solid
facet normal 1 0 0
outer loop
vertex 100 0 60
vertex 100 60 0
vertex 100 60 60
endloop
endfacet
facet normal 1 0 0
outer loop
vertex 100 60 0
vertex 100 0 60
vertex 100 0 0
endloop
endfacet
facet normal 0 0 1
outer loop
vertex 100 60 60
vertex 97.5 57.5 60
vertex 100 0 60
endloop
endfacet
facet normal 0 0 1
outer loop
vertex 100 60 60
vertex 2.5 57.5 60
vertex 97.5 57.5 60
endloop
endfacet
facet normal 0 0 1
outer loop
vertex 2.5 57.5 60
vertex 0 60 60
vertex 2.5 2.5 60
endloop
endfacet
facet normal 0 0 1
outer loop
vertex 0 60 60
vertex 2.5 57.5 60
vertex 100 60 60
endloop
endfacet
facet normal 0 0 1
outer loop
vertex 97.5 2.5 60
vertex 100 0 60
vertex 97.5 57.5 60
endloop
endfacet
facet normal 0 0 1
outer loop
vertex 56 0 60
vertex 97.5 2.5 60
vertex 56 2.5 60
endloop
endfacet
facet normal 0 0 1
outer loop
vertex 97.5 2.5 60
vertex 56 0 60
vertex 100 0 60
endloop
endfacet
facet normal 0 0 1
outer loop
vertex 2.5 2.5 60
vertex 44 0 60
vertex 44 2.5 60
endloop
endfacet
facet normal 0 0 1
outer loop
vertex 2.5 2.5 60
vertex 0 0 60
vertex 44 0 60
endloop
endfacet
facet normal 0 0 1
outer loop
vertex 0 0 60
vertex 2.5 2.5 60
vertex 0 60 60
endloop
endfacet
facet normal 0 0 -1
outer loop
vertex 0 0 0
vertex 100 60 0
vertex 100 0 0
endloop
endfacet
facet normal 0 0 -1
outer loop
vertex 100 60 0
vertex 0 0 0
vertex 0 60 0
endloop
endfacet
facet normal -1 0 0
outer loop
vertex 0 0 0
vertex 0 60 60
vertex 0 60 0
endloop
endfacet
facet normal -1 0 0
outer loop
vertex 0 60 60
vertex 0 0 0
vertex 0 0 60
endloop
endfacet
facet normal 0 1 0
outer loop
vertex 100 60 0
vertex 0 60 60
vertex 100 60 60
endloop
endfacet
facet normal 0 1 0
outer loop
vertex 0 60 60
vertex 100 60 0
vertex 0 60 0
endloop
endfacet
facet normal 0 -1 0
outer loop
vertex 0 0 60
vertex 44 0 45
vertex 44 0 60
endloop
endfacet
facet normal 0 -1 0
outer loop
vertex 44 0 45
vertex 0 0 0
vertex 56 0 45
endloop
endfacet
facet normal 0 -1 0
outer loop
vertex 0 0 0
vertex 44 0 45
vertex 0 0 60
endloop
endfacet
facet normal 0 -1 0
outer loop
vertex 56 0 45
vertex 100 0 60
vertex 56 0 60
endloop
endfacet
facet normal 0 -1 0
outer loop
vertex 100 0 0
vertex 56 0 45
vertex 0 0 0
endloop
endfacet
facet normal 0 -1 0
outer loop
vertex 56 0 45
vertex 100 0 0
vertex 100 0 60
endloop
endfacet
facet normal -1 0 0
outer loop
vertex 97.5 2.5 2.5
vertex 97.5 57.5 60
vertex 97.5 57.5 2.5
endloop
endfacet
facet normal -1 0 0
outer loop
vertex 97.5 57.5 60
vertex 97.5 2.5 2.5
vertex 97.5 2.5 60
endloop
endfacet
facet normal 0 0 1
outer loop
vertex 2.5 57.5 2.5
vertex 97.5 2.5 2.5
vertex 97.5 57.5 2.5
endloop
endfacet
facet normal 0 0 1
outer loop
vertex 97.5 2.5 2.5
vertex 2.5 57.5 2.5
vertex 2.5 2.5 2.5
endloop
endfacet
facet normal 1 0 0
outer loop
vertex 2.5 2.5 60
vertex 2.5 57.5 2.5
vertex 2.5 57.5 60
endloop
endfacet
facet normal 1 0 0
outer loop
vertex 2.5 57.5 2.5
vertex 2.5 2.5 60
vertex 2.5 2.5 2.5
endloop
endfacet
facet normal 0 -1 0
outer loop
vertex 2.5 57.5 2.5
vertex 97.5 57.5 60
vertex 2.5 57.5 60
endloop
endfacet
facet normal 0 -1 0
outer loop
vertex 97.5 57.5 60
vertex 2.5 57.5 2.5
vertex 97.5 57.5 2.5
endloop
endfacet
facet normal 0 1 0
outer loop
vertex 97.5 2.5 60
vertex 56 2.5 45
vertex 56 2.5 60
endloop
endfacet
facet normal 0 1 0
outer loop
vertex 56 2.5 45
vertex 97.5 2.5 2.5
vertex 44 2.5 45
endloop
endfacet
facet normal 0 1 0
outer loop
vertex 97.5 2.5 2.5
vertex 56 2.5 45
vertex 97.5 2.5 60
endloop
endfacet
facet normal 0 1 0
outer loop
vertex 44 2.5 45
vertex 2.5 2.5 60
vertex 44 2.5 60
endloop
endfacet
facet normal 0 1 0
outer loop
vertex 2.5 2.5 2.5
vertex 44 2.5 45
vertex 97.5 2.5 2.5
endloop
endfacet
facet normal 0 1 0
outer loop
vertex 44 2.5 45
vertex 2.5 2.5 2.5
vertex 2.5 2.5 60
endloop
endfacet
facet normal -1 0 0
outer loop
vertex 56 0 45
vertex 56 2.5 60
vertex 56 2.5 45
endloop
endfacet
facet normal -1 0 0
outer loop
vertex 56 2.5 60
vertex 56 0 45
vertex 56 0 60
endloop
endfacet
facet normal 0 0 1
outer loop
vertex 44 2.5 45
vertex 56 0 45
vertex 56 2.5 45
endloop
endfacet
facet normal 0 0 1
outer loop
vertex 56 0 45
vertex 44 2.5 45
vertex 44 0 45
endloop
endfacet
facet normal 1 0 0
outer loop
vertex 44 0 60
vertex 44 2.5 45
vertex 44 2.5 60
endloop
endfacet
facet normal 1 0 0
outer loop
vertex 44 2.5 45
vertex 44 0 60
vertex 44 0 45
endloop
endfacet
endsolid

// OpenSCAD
$fn = 32;

// ----------------------------------------------------------------------
// Enclosure box: notch enclosure
// ----------------------------------------------------------------------

// --- parameters (mm) ---
box_l = 100;              // outer length, X
box_w = 60;               // outer width, Y
box_h = 60;               // outer height
wall_t = 2.5;             // wall thickness
notch_w = 12;             // cable notch width
notch_h = 15;             // cable notch height

inner_h = box_h - wall_t;  // cavity depth
boss_h = inner_h - 2;  // corner boss height

difference() {
  cube([box_l, box_w, box_h]);
  translate([wall_t, wall_t, wall_t])
    cube([box_l - 2 * wall_t, box_w - 2 * wall_t, box_h]);
  translate([box_l / 2 - notch_w / 2, -1, box_h - notch_h])
    cube([notch_w, wall_t + 2, notch_h + 1]);
}
